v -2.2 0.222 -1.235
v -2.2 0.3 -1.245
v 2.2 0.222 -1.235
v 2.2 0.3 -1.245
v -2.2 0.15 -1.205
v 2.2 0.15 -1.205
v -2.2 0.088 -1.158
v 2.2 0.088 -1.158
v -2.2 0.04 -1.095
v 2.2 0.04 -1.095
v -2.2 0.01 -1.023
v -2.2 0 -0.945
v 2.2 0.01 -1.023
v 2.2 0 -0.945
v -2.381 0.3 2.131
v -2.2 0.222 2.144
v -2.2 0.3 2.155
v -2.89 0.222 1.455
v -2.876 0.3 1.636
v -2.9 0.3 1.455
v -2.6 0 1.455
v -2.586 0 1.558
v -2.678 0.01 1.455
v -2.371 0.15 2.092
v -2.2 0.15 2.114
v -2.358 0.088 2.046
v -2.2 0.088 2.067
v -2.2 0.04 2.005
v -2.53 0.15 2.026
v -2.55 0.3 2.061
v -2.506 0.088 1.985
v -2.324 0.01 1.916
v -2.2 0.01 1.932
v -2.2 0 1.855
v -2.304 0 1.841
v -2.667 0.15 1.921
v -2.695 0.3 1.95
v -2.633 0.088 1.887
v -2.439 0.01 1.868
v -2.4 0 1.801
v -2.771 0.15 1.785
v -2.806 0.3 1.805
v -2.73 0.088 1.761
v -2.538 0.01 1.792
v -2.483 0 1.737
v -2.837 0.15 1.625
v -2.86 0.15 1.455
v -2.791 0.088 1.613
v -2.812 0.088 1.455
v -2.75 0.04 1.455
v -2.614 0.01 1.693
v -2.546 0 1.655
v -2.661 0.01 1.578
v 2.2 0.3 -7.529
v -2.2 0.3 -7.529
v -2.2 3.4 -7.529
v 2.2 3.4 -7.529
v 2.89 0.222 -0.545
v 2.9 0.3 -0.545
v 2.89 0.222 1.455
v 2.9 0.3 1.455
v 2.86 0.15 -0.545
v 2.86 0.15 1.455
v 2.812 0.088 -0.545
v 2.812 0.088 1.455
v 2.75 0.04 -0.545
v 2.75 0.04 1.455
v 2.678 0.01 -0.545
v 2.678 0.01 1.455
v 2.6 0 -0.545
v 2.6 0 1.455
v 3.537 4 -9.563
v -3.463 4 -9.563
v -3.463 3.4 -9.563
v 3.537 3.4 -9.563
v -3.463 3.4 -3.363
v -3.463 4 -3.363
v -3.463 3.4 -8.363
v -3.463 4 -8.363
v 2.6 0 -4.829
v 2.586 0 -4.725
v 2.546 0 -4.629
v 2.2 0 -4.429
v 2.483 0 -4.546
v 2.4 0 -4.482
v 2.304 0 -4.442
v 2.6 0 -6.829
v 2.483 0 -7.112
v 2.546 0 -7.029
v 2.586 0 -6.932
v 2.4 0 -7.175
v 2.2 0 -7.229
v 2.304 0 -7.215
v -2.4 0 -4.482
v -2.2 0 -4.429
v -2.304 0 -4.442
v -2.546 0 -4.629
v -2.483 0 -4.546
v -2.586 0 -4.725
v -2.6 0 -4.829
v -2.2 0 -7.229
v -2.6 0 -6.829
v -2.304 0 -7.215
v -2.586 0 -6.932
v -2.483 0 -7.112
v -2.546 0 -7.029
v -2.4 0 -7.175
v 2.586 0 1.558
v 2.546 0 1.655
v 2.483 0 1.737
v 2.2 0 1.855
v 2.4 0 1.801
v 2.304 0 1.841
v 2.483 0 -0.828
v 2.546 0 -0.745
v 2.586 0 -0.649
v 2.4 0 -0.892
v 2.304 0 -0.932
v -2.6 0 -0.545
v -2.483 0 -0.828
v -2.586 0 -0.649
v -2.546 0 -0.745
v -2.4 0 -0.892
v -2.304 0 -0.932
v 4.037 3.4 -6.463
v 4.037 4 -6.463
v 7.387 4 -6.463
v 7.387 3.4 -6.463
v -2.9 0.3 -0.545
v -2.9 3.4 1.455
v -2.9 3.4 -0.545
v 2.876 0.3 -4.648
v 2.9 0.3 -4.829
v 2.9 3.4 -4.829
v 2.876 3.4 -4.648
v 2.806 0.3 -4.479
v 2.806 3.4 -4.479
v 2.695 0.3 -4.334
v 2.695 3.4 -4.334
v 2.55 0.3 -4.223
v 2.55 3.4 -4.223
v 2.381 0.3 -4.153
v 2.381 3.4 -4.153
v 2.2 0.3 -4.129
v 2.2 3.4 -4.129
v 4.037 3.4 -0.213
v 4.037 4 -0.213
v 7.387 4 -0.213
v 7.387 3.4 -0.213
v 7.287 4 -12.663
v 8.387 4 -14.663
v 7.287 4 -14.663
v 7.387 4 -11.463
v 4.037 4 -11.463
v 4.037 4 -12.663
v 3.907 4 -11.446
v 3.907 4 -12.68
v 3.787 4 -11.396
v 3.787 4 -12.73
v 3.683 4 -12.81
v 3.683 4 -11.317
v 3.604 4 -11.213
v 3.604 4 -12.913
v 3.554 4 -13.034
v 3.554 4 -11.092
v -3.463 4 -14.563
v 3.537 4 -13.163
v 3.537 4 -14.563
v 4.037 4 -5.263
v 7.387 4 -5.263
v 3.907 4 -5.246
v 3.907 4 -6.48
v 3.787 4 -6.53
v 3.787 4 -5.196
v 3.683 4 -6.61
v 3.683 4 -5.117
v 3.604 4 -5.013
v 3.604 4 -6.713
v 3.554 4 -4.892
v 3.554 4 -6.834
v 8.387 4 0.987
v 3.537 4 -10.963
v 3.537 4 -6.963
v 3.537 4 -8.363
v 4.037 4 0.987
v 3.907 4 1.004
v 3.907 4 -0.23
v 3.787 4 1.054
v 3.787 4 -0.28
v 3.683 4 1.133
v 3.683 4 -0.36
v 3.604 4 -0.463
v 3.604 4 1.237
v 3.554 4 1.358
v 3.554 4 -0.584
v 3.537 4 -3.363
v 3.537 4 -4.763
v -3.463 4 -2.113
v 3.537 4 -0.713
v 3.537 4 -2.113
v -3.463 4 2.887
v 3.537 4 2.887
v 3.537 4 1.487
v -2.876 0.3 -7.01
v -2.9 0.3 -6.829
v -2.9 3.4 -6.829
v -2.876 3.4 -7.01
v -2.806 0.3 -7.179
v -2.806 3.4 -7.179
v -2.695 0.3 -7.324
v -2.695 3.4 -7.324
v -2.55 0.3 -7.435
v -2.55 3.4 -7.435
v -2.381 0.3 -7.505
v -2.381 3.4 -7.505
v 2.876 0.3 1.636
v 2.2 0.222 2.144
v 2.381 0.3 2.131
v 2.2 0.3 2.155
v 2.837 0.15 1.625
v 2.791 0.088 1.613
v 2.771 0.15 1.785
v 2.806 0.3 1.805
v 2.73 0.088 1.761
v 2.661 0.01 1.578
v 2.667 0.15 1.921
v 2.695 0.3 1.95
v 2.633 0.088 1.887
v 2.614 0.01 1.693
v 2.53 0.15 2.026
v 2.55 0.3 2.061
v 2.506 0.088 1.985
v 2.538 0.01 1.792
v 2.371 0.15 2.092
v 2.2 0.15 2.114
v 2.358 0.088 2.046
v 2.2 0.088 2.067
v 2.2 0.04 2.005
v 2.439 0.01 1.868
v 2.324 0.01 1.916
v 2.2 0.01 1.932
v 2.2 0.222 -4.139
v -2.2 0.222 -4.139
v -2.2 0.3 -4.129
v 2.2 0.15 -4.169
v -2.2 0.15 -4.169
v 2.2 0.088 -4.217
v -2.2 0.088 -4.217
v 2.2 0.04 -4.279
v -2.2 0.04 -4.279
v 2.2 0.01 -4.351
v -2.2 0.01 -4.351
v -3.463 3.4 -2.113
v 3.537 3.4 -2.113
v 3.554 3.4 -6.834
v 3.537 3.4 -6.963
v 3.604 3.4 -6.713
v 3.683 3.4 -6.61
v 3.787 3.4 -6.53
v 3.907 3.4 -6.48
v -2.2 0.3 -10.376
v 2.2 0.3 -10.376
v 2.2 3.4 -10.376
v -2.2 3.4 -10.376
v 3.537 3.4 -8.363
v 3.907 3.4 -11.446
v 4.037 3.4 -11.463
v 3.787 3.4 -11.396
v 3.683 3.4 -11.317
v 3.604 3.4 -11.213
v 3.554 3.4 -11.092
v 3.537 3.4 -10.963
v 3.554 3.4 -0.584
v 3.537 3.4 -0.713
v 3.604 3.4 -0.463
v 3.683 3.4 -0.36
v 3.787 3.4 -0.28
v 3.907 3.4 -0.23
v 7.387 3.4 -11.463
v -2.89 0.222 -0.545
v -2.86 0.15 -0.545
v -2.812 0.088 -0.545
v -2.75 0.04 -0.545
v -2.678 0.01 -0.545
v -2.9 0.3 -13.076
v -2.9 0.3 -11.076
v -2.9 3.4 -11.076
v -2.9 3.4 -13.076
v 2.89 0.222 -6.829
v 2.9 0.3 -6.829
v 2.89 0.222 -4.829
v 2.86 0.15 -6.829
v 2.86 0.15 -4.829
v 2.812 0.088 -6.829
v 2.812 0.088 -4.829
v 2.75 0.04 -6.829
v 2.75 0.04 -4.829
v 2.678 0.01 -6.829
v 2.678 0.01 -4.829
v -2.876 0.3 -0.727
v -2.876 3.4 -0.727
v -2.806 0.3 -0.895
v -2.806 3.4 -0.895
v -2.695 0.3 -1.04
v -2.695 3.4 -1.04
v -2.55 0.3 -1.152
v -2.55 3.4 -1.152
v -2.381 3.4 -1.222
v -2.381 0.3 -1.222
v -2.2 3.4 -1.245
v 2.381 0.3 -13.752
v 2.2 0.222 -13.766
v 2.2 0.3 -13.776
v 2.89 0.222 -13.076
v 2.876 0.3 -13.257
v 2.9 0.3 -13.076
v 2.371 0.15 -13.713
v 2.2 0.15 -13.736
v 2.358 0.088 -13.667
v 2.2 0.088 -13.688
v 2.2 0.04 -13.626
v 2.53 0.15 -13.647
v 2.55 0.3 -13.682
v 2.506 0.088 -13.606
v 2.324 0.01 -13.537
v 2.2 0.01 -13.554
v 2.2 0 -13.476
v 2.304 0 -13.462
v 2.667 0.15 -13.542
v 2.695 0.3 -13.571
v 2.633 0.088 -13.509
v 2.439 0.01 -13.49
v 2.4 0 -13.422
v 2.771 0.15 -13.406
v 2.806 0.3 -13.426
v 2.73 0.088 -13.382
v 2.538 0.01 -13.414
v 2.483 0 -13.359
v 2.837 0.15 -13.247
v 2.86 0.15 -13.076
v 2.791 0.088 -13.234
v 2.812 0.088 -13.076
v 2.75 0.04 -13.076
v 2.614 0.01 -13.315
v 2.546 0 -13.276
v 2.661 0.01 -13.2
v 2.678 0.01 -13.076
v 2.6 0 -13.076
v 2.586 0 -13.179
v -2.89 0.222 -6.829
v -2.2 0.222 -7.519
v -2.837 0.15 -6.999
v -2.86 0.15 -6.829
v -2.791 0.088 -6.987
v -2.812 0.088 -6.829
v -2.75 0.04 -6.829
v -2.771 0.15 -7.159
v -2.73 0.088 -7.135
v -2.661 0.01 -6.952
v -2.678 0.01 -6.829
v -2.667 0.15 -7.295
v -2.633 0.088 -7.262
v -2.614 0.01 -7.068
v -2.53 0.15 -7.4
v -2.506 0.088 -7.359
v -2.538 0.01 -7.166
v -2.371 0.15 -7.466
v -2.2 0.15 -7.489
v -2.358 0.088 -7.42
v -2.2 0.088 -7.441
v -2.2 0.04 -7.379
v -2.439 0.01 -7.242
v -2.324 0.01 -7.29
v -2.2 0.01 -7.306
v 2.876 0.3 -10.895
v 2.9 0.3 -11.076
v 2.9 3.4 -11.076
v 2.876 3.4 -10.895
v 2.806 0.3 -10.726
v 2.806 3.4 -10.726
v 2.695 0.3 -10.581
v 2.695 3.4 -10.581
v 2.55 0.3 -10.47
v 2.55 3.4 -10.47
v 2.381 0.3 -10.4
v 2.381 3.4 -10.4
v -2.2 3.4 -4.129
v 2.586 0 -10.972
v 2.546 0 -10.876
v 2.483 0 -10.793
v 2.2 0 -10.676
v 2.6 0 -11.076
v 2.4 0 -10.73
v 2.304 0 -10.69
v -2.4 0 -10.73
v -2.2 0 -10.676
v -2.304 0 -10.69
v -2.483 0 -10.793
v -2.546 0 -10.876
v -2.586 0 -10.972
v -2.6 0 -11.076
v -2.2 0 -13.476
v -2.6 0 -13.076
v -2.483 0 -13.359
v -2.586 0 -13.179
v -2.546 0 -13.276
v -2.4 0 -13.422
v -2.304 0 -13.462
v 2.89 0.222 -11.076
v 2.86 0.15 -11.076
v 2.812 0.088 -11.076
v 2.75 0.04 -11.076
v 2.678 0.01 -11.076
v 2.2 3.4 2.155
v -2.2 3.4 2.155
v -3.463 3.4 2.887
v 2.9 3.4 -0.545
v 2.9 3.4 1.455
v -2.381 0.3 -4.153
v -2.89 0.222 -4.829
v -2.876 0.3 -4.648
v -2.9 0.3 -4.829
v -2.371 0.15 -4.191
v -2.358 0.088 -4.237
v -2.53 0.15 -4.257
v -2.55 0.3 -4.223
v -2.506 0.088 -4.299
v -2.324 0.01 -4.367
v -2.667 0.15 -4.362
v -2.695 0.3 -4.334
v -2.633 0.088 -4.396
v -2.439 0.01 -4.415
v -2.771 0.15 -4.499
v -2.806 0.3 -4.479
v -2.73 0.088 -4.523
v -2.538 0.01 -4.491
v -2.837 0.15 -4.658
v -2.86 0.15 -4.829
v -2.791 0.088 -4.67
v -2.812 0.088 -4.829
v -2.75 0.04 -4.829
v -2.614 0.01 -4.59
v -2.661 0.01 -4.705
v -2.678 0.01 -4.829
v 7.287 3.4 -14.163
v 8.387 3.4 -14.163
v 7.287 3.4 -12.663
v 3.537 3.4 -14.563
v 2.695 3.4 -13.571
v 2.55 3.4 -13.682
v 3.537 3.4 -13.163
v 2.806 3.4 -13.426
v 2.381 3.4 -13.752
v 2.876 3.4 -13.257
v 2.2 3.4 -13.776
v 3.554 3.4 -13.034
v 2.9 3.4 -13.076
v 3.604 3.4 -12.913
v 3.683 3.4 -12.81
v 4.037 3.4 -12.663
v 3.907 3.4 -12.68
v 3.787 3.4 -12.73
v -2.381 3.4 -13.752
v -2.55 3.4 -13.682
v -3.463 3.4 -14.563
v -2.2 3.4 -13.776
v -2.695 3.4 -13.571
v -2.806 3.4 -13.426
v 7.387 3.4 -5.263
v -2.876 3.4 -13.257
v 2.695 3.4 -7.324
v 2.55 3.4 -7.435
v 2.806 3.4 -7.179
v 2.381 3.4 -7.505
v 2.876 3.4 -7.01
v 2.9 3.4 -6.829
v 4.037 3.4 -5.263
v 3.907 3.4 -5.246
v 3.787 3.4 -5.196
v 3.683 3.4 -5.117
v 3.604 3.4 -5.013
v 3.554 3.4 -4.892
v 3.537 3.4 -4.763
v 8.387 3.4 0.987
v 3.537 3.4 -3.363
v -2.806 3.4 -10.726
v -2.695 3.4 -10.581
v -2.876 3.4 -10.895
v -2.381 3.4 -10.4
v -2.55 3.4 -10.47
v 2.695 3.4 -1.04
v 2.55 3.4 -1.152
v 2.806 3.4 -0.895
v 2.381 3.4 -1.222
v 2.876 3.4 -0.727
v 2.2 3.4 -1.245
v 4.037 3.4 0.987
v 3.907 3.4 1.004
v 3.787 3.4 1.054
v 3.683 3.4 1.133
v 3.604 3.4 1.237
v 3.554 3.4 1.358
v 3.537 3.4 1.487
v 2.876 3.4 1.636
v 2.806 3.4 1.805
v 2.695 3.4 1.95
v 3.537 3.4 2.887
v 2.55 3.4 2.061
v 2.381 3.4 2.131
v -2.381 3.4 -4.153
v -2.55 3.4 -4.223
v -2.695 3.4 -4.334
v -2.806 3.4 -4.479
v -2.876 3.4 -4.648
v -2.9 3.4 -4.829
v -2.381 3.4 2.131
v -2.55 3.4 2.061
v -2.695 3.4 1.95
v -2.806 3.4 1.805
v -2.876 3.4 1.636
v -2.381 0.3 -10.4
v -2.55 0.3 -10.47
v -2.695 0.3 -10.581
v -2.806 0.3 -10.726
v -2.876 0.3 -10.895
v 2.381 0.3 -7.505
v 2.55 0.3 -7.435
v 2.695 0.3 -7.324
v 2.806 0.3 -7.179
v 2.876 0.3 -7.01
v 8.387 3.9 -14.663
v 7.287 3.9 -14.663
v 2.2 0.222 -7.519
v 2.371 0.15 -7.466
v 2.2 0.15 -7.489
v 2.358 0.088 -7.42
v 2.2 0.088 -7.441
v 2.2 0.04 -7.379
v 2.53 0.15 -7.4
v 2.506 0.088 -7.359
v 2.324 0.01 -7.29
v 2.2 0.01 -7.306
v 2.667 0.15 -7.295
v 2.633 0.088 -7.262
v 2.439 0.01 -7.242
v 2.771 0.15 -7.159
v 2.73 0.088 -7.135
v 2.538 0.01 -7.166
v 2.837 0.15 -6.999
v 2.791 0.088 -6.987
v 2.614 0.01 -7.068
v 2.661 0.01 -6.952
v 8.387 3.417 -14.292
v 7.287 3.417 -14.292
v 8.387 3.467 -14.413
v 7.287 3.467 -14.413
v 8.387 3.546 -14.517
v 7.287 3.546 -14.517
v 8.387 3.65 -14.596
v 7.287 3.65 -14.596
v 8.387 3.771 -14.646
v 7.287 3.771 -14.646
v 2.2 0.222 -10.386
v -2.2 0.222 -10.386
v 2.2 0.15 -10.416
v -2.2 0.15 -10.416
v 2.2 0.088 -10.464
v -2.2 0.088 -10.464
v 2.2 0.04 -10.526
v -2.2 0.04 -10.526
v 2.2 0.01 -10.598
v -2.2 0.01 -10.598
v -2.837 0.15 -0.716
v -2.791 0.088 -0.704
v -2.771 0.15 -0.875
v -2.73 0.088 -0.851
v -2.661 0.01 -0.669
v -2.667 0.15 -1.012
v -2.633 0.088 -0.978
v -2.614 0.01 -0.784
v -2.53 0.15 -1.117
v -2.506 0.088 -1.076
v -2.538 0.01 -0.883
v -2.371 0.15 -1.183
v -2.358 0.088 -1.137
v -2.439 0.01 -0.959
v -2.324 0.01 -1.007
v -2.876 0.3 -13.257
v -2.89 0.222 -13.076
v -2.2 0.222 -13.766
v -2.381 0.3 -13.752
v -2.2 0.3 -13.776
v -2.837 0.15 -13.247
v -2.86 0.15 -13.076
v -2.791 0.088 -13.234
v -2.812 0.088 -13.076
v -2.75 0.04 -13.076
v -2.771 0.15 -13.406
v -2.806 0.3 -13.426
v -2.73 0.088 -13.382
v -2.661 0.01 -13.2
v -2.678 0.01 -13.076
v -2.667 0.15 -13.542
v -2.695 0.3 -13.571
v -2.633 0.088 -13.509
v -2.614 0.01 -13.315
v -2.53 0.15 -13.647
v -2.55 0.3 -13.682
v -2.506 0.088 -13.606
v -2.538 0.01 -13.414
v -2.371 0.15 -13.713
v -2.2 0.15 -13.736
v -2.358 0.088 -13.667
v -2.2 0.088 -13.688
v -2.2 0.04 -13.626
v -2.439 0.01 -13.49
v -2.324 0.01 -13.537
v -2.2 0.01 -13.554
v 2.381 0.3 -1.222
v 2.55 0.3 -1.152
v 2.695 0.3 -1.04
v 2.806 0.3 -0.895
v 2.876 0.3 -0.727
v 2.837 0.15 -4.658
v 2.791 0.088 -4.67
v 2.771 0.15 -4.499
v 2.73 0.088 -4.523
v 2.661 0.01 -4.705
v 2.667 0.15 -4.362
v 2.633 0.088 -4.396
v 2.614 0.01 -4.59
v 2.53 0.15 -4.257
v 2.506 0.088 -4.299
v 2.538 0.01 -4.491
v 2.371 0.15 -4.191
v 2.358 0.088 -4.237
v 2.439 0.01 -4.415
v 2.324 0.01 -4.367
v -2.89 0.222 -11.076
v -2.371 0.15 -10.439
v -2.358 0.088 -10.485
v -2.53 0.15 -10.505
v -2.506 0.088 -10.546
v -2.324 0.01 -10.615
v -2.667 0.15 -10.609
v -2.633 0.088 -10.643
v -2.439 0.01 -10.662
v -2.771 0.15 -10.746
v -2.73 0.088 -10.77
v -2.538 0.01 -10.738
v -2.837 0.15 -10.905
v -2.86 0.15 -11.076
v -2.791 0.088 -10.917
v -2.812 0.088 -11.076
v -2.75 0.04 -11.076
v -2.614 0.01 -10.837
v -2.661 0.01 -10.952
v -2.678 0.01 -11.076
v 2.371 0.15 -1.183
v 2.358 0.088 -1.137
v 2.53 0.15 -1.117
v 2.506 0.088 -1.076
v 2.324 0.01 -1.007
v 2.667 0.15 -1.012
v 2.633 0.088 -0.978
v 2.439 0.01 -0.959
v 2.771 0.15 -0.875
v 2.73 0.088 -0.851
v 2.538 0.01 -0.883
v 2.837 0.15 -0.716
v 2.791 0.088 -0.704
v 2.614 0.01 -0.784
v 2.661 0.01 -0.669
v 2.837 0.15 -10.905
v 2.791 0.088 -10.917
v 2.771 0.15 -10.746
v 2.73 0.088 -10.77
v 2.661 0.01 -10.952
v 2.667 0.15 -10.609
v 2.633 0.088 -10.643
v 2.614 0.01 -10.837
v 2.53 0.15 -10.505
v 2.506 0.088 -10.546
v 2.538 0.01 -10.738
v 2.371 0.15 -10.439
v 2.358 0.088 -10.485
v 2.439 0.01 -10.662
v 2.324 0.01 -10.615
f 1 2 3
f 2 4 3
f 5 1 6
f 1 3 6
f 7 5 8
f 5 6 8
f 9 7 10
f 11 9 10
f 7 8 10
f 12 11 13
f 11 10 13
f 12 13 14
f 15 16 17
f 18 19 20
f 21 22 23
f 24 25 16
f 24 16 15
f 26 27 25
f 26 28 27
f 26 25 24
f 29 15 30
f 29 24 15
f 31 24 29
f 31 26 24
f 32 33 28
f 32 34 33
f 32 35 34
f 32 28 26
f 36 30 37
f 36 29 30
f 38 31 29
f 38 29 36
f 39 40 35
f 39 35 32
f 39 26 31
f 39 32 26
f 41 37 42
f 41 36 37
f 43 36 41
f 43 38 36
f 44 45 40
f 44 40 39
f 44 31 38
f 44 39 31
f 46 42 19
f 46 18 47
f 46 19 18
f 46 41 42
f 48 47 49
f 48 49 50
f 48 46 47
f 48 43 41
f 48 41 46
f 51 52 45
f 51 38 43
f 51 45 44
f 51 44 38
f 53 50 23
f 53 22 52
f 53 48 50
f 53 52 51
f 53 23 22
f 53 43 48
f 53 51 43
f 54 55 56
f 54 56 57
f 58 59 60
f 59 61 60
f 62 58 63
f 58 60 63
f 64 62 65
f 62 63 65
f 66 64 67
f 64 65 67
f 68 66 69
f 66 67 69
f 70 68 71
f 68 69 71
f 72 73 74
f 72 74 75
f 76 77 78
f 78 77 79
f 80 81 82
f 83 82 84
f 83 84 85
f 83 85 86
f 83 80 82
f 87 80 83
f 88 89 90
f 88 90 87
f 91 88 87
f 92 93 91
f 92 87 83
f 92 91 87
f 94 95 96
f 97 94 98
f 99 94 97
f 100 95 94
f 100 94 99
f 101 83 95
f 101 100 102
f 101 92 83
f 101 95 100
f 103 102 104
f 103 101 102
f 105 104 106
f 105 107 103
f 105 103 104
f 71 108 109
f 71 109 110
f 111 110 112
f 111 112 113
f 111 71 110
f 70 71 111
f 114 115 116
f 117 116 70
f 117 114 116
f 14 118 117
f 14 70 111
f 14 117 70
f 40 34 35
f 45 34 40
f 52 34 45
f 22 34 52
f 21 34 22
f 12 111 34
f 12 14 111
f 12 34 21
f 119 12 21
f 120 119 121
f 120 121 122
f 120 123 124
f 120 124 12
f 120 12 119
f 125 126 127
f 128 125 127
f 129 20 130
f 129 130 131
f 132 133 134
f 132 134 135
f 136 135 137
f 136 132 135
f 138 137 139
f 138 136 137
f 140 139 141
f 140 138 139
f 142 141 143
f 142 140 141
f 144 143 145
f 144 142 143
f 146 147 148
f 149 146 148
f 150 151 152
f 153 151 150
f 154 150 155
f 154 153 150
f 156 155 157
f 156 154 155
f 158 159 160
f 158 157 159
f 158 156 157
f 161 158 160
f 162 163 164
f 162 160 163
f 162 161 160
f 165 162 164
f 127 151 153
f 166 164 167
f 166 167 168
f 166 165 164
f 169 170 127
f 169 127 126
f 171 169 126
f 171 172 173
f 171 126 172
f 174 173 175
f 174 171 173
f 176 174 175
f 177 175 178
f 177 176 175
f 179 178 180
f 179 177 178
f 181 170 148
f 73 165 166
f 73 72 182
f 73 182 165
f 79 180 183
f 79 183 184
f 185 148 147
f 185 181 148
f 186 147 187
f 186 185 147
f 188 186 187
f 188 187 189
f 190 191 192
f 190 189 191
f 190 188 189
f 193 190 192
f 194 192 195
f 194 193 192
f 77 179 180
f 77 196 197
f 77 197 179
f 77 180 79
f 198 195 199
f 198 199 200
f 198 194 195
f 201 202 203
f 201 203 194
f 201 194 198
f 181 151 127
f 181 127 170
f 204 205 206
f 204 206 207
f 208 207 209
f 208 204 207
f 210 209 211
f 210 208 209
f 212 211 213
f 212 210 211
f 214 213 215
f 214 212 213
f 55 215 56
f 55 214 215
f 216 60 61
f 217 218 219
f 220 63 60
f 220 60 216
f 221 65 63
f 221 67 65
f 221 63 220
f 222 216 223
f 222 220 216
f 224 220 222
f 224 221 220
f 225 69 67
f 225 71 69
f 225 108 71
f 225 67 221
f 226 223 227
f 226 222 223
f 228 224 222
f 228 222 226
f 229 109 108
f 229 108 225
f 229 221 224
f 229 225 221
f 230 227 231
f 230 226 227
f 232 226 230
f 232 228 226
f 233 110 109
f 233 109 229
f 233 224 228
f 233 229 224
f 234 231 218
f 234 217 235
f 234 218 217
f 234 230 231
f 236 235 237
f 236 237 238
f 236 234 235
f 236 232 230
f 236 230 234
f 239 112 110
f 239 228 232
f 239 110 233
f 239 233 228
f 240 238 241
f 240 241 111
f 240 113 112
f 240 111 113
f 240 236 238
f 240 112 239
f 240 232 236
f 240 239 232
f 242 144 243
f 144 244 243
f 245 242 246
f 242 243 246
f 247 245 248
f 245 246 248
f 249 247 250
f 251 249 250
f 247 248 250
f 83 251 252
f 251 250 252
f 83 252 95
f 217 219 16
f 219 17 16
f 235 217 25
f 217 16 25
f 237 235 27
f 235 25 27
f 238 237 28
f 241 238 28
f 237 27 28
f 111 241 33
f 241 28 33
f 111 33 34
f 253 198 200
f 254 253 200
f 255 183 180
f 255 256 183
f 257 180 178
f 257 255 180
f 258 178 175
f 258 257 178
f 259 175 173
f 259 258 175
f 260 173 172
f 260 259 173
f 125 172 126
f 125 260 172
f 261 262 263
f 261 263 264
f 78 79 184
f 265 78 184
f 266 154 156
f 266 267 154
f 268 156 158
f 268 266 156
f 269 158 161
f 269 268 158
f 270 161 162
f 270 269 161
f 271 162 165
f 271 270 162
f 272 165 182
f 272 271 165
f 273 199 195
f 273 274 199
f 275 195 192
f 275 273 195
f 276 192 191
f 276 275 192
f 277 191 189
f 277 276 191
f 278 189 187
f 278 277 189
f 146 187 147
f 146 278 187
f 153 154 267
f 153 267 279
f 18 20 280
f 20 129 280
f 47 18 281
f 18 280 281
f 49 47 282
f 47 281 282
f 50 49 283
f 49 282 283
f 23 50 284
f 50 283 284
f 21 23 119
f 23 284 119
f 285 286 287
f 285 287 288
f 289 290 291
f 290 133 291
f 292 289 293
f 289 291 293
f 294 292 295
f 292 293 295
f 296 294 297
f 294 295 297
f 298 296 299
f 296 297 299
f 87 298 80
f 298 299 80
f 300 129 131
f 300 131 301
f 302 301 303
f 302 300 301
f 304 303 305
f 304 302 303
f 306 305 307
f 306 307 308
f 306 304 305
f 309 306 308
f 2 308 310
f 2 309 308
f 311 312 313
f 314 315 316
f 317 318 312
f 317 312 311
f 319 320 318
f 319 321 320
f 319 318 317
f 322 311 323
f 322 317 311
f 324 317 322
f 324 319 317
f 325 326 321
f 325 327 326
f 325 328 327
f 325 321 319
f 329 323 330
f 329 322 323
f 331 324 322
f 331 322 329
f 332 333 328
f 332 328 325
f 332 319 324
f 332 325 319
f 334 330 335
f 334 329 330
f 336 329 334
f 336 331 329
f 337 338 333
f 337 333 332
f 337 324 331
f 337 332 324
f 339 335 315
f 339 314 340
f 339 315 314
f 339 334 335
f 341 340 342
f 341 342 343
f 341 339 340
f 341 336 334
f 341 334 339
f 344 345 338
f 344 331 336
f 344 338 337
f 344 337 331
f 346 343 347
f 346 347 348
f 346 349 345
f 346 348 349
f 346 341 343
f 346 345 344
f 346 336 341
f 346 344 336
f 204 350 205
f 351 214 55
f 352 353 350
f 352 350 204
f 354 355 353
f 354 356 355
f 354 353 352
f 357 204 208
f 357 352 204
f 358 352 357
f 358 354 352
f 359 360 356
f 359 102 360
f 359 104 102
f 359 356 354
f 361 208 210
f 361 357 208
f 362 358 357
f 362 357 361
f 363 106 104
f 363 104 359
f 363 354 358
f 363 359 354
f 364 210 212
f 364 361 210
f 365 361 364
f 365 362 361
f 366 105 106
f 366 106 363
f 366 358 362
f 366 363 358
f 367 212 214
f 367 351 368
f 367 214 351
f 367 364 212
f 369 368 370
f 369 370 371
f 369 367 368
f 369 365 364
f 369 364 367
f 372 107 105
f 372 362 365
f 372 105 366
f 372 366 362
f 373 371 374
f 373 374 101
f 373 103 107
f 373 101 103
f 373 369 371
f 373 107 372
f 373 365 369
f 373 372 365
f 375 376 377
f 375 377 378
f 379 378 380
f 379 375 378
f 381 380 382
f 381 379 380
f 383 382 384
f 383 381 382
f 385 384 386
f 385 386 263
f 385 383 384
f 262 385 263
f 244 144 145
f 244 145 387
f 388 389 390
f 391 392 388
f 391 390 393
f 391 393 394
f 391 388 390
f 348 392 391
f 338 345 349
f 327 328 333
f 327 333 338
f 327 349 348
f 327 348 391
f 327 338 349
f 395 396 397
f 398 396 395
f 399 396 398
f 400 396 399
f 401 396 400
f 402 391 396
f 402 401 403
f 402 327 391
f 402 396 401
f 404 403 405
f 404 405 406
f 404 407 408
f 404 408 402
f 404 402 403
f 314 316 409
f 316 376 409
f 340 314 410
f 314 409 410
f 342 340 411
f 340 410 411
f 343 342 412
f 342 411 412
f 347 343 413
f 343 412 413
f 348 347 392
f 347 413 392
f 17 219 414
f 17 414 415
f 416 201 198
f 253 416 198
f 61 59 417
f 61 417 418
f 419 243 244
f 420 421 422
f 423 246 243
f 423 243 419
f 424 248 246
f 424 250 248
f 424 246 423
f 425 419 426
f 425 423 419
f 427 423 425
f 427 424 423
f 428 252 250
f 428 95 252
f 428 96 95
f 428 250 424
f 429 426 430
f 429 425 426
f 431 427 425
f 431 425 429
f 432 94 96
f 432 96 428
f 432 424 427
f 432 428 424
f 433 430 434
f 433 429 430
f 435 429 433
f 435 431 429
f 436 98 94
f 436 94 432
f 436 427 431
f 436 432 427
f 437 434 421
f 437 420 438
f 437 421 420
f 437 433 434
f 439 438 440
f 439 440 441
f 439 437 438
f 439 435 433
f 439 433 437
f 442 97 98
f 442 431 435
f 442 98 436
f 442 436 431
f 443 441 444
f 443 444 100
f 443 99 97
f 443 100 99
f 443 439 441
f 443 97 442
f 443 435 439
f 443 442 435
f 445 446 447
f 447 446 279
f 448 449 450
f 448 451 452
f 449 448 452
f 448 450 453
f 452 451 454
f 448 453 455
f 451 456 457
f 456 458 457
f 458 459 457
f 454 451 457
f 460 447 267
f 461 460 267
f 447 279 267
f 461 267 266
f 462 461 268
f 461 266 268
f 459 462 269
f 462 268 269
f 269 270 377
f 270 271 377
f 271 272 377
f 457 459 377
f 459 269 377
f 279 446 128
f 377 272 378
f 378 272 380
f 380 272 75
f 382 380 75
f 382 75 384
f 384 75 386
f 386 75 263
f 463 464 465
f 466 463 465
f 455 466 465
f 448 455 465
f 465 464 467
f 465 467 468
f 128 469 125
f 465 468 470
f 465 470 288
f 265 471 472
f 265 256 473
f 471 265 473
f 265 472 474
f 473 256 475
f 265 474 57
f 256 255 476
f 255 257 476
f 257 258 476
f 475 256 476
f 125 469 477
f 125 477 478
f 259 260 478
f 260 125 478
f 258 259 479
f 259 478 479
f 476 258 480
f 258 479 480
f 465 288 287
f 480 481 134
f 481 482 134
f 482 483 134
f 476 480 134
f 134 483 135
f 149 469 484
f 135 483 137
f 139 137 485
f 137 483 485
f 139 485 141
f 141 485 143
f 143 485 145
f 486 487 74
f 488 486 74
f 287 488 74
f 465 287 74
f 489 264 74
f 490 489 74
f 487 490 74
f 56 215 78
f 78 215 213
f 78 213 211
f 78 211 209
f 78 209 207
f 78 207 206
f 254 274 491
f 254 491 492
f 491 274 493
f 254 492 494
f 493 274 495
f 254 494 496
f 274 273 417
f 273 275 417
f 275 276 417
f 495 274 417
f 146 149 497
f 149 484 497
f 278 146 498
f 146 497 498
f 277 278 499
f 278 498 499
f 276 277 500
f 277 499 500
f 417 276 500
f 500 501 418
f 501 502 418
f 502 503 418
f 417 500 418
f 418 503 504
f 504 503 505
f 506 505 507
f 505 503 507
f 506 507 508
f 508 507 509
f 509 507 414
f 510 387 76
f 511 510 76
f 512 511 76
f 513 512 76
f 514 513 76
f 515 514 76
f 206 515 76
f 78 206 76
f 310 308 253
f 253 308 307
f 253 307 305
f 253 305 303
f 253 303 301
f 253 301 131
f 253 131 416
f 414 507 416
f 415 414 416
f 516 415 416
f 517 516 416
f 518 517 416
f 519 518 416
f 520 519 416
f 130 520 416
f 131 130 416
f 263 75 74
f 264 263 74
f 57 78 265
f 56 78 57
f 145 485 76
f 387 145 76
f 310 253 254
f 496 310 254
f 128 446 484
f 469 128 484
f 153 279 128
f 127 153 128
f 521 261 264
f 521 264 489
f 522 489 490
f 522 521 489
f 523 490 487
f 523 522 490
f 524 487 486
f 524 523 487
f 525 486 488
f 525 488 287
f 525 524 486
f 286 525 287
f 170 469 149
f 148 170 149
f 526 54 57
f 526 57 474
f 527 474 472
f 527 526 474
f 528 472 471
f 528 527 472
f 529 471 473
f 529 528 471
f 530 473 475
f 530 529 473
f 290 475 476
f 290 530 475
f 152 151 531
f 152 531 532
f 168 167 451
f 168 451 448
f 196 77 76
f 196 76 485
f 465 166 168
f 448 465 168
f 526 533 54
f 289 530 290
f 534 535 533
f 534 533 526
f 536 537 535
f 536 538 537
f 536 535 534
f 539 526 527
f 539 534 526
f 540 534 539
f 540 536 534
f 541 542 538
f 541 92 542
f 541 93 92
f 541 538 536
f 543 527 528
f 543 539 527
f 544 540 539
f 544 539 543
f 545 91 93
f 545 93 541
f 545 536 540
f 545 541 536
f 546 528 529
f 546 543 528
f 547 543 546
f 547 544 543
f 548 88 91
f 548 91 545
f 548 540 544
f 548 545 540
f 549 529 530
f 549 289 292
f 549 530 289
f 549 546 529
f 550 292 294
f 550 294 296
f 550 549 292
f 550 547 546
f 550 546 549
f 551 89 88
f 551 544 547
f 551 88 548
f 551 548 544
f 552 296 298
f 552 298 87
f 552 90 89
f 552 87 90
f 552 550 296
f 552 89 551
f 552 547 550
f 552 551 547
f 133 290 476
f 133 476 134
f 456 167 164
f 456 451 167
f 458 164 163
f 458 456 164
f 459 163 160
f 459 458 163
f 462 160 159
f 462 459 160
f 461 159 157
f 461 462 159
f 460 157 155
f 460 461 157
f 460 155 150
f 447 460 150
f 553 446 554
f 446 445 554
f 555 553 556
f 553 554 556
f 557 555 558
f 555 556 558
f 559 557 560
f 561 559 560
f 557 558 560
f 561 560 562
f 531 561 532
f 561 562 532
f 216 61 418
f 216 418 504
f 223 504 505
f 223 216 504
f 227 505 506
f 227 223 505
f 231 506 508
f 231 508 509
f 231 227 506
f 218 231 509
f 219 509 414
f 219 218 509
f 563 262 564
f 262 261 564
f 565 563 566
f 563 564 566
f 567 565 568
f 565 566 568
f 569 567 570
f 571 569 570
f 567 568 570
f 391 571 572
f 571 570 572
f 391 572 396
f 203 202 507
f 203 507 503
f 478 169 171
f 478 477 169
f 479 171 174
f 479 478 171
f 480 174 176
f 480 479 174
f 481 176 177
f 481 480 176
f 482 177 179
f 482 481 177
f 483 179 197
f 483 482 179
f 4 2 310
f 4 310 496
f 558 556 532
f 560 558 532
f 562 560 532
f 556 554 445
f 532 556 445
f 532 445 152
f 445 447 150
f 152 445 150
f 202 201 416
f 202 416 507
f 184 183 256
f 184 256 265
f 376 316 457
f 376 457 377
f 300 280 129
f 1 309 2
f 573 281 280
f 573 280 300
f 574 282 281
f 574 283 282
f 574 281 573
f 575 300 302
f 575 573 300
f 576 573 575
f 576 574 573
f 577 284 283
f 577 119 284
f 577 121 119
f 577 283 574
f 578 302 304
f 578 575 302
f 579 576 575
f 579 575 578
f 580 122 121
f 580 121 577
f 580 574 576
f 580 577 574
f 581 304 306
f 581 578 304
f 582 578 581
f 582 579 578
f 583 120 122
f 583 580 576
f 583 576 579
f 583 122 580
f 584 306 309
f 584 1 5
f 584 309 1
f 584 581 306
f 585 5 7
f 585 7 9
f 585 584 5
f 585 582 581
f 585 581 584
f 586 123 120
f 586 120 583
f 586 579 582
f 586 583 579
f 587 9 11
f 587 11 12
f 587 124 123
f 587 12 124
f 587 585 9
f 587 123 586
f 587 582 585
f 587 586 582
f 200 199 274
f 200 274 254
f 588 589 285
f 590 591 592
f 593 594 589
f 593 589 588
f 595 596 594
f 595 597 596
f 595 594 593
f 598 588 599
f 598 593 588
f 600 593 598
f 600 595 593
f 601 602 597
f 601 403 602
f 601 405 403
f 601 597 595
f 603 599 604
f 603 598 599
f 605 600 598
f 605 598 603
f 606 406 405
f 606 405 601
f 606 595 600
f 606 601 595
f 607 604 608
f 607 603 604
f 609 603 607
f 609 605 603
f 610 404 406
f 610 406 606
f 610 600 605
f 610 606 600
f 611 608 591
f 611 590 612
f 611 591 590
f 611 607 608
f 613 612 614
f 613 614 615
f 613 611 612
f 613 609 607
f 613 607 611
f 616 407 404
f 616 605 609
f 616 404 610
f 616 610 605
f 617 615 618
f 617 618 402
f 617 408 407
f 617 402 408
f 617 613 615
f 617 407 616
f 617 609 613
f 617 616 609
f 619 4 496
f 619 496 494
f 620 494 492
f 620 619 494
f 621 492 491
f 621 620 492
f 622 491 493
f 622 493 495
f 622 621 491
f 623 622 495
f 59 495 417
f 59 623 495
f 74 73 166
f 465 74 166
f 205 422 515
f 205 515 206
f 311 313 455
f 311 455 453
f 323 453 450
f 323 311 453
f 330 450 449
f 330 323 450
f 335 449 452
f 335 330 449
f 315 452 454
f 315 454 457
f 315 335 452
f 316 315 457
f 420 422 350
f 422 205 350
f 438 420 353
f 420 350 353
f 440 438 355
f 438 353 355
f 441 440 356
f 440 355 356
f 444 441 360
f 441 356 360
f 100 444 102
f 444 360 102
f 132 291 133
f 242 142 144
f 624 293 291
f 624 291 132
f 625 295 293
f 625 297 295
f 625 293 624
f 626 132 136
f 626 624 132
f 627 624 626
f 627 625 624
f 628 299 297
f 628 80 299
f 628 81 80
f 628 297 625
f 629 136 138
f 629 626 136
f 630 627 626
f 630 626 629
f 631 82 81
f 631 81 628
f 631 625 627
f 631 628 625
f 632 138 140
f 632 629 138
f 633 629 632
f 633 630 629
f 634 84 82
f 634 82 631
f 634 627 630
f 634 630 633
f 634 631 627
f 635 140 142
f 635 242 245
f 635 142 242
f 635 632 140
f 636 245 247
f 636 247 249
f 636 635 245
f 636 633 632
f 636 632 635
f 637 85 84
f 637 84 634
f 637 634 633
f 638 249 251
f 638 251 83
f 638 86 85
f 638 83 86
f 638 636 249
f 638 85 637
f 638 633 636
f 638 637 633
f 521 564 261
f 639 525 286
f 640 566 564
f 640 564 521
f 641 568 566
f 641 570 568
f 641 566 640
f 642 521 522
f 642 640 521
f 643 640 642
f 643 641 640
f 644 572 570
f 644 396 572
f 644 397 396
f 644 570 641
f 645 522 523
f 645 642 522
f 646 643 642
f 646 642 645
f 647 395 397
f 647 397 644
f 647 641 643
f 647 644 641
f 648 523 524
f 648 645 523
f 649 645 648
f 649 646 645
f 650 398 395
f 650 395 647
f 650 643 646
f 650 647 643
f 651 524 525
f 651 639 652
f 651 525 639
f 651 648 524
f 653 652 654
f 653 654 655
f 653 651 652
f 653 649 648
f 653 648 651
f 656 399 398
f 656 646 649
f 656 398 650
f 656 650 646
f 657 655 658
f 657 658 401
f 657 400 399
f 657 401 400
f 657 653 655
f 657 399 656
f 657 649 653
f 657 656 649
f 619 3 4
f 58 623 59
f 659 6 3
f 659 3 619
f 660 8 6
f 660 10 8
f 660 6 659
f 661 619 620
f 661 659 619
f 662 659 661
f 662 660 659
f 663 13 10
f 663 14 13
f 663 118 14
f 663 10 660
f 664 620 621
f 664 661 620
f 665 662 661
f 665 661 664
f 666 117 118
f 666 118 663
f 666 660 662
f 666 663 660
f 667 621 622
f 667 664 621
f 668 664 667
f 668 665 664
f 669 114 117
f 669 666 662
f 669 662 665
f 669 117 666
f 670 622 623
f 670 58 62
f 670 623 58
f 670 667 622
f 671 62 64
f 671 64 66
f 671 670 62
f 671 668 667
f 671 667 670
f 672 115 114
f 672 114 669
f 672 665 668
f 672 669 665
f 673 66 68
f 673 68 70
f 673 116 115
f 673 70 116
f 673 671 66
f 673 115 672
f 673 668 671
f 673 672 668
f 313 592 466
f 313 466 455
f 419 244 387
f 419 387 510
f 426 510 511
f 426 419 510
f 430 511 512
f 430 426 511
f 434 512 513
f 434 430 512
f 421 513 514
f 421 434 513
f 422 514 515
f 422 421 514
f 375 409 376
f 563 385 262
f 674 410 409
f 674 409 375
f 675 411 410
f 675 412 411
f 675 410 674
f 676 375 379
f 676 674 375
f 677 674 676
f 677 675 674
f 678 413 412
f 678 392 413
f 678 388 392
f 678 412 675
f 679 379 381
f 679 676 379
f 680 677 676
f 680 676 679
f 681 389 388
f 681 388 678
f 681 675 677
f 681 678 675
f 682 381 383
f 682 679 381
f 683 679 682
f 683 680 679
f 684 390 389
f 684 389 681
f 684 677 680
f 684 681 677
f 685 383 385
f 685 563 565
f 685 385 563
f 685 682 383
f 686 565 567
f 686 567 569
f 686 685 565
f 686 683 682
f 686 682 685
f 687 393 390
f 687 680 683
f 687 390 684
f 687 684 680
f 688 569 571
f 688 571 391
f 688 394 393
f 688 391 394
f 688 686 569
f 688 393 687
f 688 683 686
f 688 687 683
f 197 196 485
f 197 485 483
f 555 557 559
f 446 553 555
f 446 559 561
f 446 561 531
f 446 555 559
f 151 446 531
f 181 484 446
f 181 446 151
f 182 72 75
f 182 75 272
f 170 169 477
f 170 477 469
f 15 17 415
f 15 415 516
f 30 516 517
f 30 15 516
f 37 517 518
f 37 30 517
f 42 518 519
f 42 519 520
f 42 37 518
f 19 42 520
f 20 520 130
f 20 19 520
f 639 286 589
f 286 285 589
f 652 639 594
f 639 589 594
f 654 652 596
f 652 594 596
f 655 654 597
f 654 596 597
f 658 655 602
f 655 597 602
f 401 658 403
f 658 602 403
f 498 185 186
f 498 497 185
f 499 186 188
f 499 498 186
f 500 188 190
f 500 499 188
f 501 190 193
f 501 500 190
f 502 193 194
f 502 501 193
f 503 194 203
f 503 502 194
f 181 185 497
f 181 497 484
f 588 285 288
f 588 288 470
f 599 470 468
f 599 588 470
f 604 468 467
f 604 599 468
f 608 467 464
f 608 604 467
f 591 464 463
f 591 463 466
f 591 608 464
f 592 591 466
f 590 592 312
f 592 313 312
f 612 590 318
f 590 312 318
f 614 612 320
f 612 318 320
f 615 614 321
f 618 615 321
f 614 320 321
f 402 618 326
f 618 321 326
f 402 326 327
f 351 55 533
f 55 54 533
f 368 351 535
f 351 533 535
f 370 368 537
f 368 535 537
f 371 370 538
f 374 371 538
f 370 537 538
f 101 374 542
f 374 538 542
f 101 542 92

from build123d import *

# Parameters (mm, degrees)
EXTRUDE_1_DEPTH   = 4
EXTRUDE_1_2_DEPTH = 4
EXTRUDE_1_3_DEPTH = 4
SKETCH_2_W        = 7
SKETCH_2_H        = 5
EXTRUDE_2_DEPTH   = 0.6
SKETCH_3_W        = 4.85
SKETCH_3_H        = 1.2
EXTRUDE_3_DEPTH   = 0.6
SKETCH_4_W        = 1
SKETCH_4_H        = 13.65
EXTRUDE_4_DEPTH   = 0.6
FILLET_1_R        = 0.5
FILLET_2_R        = 0.3
SKETCH_5_W        = 1.1
SKETCH_5_H        = 0.6
EXTRUDE_5_DEPTH   = 2
FILLET_3_R        = 0.5


with BuildPart() as part:
    # 草图1 → 凸台-拉伸1 (new body)
    with BuildSketch(Plane(origin=(0, 0, 0), x_dir=(1, 0, 0), z_dir=(0, 1, 0))):
        with BuildLine():
            Line((-2.2, 1.245389122), (2.2, 1.245389122))
            ThreePointArc((2.2, 1.245389122), (2.694974747, 1.040363869), (2.9, 0.545389122))
            Line((2.9, 0.545389122), (2.9, -1.454610878))
            ThreePointArc((2.9, -1.454610878), (2.694974747, -1.949585625), (2.2, -2.154610878))
            Line((2.2, -2.154610878), (-2.2, -2.154610878))
            ThreePointArc((-2.2, -2.154610878), (-2.694974747, -1.949585625), (-2.9, -1.454610878))
            Line((-2.9, -1.454610878), (-2.9, 0.545389122))
            ThreePointArc((-2.9, 0.545389122), (-2.694974747, 1.040363869), (-2.2, 1.245389122))
        make_face()
    extrude(amount=EXTRUDE_1_DEPTH)



with BuildPart() as body_2:
    # 草图1 → Extrude 1 2 (new body)
    with BuildSketch(Plane(origin=(0, 0, 0), x_dir=(1, 0, 0), z_dir=(0, 1, 0))):
        with BuildLine():
            Line((-2.2, 7.528722779), (2.2, 7.528722779))
            ThreePointArc((2.2, 7.528722779), (2.694974747, 7.323697526), (2.9, 6.828722779))
            Line((2.9, 6.828722779), (2.9, 4.828722779))
            ThreePointArc((2.9, 4.828722779), (2.694974747, 4.333748032), (2.2, 4.128722779))
            Line((2.2, 4.128722779), (-2.2, 4.128722779))
            ThreePointArc((-2.2, 4.128722779), (-2.694974747, 4.333748032), (-2.9, 4.828722779))
            Line((-2.9, 4.828722779), (-2.9, 6.828722779))
            ThreePointArc((-2.9, 6.828722779), (-2.694974747, 7.323697526), (-2.2, 7.528722779))
        make_face()
    extrude(amount=EXTRUDE_1_2_DEPTH)


with BuildPart() as body_3:
    # 草图1 → Extrude 1 3 (new body)
    with BuildSketch(Plane(origin=(0, 0, 0), x_dir=(1, 0, 0), z_dir=(0, 1, 0))):
        with BuildLine():
            Line((-2.2, 13.775919566), (2.2, 13.775919566))
            ThreePointArc((2.2, 13.775919566), (2.694974747, 13.570894313), (2.9, 13.075919566))
            Line((2.9, 13.075919566), (2.9, 11.075919566))
            ThreePointArc((2.9, 11.075919566), (2.694974747, 10.580944819), (2.2, 10.375919566))
            Line((2.2, 10.375919566), (-2.2, 10.375919566))
            ThreePointArc((-2.2, 10.375919566), (-2.694974747, 10.580944819), (-2.9, 11.075919566))
            Line((-2.9, 11.075919566), (-2.9, 13.075919566))
            ThreePointArc((-2.9, 13.075919566), (-2.694974747, 13.570894313), (-2.2, 13.775919566))
        make_face()
    extrude(amount=EXTRUDE_1_3_DEPTH)


with BuildPart() as part_1:
    add(part.part)

    add(body_2.part)  # 凸台-拉伸2 merges body 2

    add(body_3.part)  # 凸台-拉伸2 merges body 3
    # 草图2 → 凸台-拉伸2 (add)
    with BuildSketch(Plane(origin=(0, 4, 0), x_dir=(1, 0, 0), z_dir=(0, 1, 0))):
        with Locations((0.036699987, 12.063062551)):
            Rectangle(SKETCH_2_W, SKETCH_2_H)
        with Locations((0.036699987, 5.863062551)):
            Rectangle(SKETCH_2_W, SKETCH_2_H)
        with Locations((0.036699987, -0.386937449)):
            Rectangle(SKETCH_2_W, SKETCH_2_H)
    extrude(amount=-EXTRUDE_2_DEPTH)

    # 草图3 → 凸台-拉伸3 (add)
    with BuildSketch(Plane(origin=(0, 4, 0), x_dir=(1, 0, 0), z_dir=(0, 1, 0))):
        with Locations((5.961699987, 12.063062551)):
            Rectangle(SKETCH_3_W, SKETCH_3_H)
        with Locations((5.961699987, 5.863062551)):
            Rectangle(SKETCH_3_W, SKETCH_3_H)
        with Locations((5.961699987, -0.386937449)):
            Rectangle(SKETCH_3_W, SKETCH_3_H)
    extrude(amount=-EXTRUDE_3_DEPTH)

    # 草图4 → 凸台-拉伸4 (add)
    with BuildSketch(Plane.XZ.offset(-3.4)):
        with Locations((7.886699987, -5.838062551)):
            Rectangle(SKETCH_4_W, SKETCH_4_H)
    extrude(amount=-EXTRUDE_4_DEPTH)

    # 圆角1
    fillet_1_edges = [part_1.edges().sort_by_distance(p)[0] for p in [
        (3.536699987, 3.7, -11.463062551),
        (3.536699987, 3.7, -12.663062551),
        (3.536699987, 3.7, 0.986937449),
        (3.536699987, 3.7, -0.213062551),
        (3.536699987, 3.7, -5.263062551),
        (3.536699987, 3.7, -6.463062551),
    ]]
    fillet(fillet_1_edges, radius=FILLET_1_R)

    # 圆角2
    fillet_2_edges = [part_1.edges().sort_by_distance(p)[0] for p in [
        (-2.9, 0, 0.454610878),
        (-2.694974747, 0, -1.040363869),
        (-2.694974747, 0, -13.570894313),
        (-2.9, 0, -12.075919566),
        (-2.694974747, 0, -10.580944819),
        (0, 0, -10.375919566),
        (2.694974747, 0, -10.580944819),
        (2.9, 0, -12.075919566),
        (2.694974747, 0, -13.570894313),
        (0, 0, -13.775919566),
        (0, 0, -1.245389122),
        (2.694974747, 0, -1.040363869),
        (2.9, 0, 0.454610878),
        (2.694974747, 0, 1.949585625),
        (-2.694974747, 0, -7.323697526),
        (-2.9, 0, -5.828722779),
        (-2.694974747, 0, -4.333748032),
        (0, 0, -4.128722779),
        (2.694974747, 0, -4.333748032),
        (2.9, 0, -5.828722779),
        (0, 0, 2.154610878),
        (2.694974747, 0, -7.323697526),
        (0, 0, -7.528722779),
        (-2.694974747, 0, 1.949585625),
    ]]
    fillet(fillet_2_edges, radius=FILLET_2_R)

    # 草图5 → 凸台-拉伸5 (add)
    with BuildSketch(Plane(origin=(0, 0, -12.663062551), x_dir=(-1, 0, 0), z_dir=(0, 0, -1))):
        with Locations((-7.836699987, 3.7)):
            Rectangle(SKETCH_5_W, SKETCH_5_H)
    extrude(amount=EXTRUDE_5_DEPTH)

    # 圆角3
    fillet_3_edges = [part_1.edges().sort_by_distance(p)[0] for p in [
        (7.836699987, 3.4, -14.663062551),
    ]]
    fillet(fillet_3_edges, radius=FILLET_3_R)


solid = part_1.part
